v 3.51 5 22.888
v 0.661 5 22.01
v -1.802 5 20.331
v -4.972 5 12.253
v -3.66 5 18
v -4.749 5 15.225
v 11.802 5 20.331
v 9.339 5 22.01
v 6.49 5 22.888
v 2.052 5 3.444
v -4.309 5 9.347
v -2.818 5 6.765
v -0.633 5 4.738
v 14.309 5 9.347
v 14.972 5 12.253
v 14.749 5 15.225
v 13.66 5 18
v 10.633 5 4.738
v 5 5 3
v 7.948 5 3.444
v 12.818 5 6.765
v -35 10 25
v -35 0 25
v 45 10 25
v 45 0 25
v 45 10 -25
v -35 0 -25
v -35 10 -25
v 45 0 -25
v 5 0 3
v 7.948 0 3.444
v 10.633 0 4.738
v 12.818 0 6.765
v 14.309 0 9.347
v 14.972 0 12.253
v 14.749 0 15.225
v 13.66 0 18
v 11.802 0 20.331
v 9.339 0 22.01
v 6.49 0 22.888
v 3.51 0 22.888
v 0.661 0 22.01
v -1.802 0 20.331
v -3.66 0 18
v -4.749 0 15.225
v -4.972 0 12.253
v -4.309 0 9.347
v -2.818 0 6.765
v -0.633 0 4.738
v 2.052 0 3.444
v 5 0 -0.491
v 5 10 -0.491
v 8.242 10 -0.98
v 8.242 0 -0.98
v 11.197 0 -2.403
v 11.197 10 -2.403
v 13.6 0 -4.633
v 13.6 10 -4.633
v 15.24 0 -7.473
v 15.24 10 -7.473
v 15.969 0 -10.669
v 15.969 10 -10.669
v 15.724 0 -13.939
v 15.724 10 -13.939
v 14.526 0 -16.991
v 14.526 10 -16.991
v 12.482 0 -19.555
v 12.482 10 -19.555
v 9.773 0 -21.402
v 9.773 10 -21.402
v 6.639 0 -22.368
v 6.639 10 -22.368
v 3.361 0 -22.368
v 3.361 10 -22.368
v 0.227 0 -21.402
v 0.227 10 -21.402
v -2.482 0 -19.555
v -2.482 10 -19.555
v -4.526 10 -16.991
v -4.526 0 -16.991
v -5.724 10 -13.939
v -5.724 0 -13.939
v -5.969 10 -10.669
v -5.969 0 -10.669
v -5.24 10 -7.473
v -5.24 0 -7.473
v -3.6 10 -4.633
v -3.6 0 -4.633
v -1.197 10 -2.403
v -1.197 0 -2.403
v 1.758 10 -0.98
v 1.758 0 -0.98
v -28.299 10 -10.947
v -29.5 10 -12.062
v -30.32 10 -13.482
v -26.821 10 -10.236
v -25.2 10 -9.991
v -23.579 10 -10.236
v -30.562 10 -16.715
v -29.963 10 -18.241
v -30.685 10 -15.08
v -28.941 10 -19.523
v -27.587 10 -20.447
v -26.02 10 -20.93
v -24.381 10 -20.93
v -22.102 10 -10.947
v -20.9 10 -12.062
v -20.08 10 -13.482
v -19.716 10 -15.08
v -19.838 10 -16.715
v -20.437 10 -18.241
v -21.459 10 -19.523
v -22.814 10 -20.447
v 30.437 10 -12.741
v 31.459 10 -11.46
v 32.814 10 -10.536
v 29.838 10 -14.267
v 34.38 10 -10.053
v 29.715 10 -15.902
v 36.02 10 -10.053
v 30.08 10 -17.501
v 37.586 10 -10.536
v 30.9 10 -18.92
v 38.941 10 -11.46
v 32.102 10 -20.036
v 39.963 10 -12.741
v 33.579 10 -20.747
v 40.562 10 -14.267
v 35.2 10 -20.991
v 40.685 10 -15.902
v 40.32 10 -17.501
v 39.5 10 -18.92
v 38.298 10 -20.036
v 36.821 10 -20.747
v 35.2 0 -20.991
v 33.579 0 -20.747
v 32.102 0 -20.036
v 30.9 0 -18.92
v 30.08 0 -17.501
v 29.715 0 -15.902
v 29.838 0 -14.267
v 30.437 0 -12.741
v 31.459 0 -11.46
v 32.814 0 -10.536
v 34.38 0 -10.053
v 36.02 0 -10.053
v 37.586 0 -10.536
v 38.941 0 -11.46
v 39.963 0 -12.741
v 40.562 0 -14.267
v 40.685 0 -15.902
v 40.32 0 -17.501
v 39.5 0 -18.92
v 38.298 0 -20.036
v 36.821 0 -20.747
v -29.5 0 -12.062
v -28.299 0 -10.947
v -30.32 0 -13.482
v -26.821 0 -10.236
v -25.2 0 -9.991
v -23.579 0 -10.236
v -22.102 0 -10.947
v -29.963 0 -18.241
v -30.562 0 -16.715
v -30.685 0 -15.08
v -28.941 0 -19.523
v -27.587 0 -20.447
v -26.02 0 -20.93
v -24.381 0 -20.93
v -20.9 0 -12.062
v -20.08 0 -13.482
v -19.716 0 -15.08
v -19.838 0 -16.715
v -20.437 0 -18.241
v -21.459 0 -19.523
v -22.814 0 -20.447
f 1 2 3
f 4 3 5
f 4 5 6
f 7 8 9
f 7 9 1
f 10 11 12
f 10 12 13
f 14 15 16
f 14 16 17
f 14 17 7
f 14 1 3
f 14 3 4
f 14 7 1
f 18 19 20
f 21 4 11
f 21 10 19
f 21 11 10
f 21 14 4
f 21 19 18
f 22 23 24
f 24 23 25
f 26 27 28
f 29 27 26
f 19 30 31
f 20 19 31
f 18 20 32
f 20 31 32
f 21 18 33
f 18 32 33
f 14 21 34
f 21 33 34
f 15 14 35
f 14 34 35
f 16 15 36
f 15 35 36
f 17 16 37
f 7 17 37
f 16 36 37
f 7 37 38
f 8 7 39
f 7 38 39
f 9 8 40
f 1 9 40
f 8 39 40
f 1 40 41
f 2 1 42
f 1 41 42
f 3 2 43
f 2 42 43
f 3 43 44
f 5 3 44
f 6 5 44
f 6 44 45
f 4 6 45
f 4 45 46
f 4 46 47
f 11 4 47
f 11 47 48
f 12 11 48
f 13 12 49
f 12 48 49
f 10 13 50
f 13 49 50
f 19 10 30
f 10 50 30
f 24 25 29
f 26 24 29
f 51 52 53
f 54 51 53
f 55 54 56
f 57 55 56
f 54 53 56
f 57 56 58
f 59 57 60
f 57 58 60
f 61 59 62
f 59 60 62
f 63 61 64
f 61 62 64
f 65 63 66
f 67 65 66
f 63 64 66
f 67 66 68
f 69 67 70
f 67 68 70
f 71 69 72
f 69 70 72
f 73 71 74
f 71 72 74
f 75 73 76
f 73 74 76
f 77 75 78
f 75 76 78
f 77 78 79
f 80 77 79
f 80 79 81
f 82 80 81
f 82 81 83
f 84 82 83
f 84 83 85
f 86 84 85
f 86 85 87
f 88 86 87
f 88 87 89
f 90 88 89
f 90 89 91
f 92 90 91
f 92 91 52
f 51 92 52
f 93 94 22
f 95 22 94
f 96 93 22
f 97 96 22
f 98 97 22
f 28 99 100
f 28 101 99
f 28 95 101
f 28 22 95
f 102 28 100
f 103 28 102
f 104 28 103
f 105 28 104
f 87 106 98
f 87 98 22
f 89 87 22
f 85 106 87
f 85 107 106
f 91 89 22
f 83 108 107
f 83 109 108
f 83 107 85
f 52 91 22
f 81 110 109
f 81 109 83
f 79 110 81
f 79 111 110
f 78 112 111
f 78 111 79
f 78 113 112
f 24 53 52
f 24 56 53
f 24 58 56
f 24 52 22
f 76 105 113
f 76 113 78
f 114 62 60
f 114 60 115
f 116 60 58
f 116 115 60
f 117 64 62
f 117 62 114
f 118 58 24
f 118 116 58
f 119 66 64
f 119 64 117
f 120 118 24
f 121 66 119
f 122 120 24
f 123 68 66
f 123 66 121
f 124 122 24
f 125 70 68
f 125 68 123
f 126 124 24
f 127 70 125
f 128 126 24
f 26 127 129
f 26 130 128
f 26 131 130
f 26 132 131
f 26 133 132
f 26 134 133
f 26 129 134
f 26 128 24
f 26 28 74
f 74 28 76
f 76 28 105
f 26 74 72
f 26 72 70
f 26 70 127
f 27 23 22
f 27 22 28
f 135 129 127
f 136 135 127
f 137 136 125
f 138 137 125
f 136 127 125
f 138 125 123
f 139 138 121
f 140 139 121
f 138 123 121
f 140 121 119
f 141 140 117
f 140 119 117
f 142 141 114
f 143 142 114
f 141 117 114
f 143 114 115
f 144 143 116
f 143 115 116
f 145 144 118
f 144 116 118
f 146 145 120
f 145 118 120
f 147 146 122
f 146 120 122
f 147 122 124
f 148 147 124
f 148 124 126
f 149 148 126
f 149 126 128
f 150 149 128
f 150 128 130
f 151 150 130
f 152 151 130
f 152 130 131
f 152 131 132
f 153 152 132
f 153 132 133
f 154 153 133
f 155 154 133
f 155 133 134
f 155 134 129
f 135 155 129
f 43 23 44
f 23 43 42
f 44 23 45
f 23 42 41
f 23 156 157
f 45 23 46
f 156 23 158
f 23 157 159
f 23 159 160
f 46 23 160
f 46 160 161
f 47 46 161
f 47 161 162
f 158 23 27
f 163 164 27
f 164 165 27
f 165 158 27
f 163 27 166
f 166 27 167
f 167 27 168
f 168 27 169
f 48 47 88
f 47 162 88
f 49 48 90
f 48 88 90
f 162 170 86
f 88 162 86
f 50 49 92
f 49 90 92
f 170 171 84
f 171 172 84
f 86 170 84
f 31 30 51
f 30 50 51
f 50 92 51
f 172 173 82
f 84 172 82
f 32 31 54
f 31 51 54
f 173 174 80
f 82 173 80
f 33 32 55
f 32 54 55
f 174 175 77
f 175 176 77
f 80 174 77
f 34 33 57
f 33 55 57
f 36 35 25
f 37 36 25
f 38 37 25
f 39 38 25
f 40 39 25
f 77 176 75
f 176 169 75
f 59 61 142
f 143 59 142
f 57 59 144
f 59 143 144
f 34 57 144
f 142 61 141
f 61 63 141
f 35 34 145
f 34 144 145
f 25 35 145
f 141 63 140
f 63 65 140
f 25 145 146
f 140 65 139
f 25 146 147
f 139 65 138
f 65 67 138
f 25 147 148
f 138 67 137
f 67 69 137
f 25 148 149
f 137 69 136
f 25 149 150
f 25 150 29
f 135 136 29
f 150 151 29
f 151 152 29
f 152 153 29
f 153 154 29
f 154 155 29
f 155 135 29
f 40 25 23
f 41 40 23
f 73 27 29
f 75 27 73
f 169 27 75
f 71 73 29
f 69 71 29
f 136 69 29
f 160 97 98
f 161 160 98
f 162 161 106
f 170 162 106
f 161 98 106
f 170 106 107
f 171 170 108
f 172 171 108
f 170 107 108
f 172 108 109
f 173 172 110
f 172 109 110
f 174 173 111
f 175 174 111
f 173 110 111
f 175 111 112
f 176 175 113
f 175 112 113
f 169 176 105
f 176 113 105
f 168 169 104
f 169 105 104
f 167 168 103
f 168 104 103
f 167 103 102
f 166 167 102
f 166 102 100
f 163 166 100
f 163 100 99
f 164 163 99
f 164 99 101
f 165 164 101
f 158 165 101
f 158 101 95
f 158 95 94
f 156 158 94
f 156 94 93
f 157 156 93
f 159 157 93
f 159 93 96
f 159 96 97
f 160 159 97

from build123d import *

# Parameters (mm, degrees)
SKETCH1_W           = 80
SKETCH1_H           = 50
BOSS_EXTRUDE1_DEPTH = 10
SKETCH2_R           = 5.5
SKETCH2_R_2         = 11
CUT_EXTRUDE1_DEPTH  = 53.440442409
SKETCH3_R           = 10
CUT_EXTRUDE2_DEPTH  = 5


with BuildPart() as part:
    # Sketch1 → Boss-Extrude1 (new body)
    with BuildSketch(Plane(origin=(0, 0, 0), x_dir=(1, 0, 0), z_dir=(0, 1, 0))):
        with Locations((5, 0)):
            Rectangle(SKETCH1_W, SKETCH1_H)
    extrude(amount=BOSS_EXTRUDE1_DEPTH)

    # Sketch2 → Cut-Extrude1 (cut, through all)
    with BuildSketch(Plane(origin=(0, 10, 0), x_dir=(1, 0, 0), z_dir=(0, 1, 0))):
        with Locations(Location((-25.20025306, 15.49130346, 0), (0, 0, 270))):
            Circle(SKETCH2_R)
        with Locations(Location((35.2, 15.49130346, 0), (0, 0, 90))):
            Circle(SKETCH2_R)
        with Locations(Location((5, 11.49130346, 0), (0, 0, 270))):
            Circle(SKETCH2_R_2)
    extrude(amount=-CUT_EXTRUDE1_DEPTH, mode=Mode.SUBTRACT)

    # Sketch3 → Cut-Extrude2 (cut)
    with BuildSketch(Plane.XZ):
        with Locations(Location((5, 13, 0), (0, 0, 270))):
            Circle(SKETCH3_R)
    extrude(amount=-CUT_EXTRUDE2_DEPTH, mode=Mode.SUBTRACT)


solid = part.part
